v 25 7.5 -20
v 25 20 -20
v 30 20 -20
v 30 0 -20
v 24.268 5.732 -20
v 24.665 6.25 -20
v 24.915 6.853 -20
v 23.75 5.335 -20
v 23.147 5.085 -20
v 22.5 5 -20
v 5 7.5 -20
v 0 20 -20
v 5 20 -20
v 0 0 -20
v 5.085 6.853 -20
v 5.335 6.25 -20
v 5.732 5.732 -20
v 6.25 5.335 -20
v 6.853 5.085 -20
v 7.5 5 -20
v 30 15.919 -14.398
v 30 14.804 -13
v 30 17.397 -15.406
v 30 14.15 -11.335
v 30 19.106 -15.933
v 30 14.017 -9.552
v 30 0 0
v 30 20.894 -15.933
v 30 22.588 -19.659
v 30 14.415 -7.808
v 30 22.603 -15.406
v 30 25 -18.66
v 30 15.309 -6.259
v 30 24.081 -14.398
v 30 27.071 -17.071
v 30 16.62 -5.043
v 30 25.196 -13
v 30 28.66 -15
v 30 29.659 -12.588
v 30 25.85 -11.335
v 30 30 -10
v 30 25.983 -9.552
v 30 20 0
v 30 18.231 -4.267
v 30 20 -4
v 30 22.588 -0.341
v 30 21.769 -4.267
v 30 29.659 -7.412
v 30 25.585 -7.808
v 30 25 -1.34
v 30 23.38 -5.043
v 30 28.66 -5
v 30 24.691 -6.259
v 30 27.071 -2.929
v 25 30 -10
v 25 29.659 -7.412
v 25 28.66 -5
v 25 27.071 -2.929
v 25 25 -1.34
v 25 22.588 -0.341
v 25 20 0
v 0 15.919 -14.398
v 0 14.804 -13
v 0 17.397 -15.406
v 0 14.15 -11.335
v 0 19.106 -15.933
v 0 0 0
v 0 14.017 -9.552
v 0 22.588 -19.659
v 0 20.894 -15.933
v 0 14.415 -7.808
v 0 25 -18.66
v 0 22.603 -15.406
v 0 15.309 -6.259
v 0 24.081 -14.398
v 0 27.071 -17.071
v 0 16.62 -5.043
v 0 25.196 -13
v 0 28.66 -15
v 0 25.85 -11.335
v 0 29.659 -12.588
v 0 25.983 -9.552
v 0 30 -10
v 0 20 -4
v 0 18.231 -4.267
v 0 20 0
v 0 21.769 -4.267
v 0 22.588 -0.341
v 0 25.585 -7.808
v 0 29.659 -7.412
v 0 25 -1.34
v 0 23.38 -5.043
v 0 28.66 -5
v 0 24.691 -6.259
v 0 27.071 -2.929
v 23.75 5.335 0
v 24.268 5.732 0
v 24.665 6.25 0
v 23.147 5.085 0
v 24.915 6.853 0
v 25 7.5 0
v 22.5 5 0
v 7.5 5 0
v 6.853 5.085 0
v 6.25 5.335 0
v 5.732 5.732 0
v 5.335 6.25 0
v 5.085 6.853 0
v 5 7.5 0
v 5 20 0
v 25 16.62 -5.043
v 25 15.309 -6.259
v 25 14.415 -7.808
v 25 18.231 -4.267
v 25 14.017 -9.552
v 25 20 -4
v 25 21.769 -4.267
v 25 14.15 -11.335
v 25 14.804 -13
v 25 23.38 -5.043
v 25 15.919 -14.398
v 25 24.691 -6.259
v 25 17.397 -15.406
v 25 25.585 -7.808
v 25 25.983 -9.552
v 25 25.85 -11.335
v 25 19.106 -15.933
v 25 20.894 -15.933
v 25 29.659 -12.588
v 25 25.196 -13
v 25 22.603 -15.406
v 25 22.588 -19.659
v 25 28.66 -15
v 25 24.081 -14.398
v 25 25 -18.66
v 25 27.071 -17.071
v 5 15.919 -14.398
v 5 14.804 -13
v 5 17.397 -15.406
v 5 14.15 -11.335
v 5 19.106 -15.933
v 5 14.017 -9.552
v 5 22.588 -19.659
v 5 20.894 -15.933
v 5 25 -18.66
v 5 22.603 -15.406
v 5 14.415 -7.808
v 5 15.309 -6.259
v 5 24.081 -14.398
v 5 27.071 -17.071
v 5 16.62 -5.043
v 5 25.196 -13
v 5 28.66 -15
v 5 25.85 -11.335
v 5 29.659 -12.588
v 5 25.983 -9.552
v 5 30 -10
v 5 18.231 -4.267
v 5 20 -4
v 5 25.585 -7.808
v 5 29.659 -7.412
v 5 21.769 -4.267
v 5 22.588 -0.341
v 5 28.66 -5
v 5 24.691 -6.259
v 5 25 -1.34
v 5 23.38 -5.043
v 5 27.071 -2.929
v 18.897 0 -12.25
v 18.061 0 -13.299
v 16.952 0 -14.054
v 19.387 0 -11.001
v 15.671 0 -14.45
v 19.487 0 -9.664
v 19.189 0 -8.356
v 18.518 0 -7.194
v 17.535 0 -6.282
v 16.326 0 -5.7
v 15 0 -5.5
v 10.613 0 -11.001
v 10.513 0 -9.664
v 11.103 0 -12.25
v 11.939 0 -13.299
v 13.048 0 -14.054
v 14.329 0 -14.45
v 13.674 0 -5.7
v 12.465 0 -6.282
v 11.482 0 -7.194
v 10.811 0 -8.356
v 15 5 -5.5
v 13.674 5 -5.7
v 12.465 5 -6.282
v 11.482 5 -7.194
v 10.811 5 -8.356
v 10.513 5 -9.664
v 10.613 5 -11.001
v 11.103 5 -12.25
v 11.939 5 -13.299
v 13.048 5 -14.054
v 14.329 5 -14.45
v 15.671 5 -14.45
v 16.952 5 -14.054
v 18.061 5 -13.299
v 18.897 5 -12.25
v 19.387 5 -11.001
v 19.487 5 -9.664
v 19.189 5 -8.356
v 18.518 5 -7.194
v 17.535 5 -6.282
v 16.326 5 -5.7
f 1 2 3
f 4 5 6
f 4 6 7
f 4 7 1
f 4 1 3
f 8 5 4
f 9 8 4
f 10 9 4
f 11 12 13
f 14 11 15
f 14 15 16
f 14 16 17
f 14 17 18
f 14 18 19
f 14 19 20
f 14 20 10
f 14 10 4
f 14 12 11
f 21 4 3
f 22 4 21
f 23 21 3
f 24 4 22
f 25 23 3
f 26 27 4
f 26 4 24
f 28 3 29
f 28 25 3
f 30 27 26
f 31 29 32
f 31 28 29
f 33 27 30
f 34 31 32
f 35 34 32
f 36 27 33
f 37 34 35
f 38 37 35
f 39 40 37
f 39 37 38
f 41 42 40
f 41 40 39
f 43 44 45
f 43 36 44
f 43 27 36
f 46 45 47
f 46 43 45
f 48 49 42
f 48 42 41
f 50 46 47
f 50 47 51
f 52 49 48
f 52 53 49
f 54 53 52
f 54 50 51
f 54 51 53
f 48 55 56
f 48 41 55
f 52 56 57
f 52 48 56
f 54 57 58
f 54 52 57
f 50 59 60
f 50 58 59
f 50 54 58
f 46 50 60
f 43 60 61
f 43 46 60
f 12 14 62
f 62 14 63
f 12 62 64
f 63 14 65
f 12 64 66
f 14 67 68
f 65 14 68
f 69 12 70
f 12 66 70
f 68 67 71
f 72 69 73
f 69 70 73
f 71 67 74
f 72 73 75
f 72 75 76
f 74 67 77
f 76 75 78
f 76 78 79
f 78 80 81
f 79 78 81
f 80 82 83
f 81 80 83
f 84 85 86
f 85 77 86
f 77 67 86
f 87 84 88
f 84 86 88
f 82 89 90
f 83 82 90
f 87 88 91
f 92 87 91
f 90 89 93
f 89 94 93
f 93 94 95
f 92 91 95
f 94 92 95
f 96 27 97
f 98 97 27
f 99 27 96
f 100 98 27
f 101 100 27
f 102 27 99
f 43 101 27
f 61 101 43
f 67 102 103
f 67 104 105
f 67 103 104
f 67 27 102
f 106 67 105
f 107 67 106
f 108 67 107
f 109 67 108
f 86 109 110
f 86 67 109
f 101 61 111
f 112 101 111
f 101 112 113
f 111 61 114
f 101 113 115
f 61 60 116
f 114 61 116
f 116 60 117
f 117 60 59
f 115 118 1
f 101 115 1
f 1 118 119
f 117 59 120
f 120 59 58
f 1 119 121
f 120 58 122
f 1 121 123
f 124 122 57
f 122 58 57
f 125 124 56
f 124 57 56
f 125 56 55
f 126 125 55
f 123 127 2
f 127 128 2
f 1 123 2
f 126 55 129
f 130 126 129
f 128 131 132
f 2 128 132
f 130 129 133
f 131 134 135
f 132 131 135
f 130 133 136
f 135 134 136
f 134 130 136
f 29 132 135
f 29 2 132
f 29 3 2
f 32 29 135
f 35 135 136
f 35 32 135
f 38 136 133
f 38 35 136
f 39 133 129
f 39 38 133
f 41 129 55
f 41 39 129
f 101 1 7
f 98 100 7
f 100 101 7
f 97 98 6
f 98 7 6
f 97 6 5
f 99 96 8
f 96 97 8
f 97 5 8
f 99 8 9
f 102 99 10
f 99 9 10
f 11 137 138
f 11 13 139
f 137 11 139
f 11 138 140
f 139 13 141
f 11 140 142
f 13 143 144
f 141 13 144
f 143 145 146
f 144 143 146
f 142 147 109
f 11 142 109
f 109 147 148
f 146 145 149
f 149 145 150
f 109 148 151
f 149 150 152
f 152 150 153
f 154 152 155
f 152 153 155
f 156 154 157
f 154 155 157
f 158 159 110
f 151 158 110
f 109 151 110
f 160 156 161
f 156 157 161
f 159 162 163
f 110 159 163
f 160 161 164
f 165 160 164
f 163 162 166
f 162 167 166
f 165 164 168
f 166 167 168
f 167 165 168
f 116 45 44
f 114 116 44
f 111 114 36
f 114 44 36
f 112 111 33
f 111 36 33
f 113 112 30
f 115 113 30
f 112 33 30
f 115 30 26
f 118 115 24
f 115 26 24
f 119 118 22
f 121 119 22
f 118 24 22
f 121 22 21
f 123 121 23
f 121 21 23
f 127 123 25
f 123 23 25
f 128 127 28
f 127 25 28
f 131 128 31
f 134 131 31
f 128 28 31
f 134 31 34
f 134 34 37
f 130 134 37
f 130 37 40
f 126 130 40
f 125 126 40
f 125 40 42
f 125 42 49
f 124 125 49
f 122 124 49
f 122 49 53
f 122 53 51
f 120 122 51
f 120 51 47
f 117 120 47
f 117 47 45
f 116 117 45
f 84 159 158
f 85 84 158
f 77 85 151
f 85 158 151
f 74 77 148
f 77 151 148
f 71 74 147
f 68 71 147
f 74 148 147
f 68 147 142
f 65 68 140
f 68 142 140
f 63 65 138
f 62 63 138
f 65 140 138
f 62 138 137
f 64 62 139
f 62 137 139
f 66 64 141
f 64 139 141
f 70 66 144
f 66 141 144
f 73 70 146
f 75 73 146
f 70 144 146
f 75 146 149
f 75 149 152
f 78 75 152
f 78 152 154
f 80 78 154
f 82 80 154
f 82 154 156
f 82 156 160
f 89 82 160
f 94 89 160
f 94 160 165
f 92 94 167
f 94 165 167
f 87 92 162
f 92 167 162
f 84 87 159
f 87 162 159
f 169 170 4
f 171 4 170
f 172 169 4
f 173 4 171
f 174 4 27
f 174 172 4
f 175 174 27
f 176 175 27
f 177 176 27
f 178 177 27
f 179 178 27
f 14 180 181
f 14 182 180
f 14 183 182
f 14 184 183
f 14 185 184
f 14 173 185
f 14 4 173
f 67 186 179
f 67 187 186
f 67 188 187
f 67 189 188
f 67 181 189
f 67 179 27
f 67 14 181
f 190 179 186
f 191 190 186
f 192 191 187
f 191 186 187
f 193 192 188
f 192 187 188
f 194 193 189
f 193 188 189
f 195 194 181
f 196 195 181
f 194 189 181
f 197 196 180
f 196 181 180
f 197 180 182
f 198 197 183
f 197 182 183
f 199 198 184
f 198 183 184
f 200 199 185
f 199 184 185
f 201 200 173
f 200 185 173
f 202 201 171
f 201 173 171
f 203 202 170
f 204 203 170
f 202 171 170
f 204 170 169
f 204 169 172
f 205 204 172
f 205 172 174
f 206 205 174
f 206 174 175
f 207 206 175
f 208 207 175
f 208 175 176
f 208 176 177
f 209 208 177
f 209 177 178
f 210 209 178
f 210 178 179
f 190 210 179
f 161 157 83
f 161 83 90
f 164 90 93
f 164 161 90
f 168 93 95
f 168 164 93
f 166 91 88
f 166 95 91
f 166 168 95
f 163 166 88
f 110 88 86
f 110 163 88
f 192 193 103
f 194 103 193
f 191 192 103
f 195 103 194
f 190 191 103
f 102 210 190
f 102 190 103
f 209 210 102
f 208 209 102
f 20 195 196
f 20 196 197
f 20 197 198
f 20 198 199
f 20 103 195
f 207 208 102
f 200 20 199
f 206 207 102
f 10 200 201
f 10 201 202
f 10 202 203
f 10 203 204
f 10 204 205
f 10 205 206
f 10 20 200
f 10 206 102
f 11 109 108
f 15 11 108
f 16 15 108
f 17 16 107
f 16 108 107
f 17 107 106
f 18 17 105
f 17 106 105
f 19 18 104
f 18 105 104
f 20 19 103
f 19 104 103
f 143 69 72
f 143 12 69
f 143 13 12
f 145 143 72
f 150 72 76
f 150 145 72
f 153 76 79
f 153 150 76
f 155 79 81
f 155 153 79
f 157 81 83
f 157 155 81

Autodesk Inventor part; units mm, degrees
ref_plane "YZ Plane" through (0, 0, 0) normal (1, 0, 0) x (0, 1, 0)
ref_plane "XZ Plane" through (0, 0, 0) normal (0, 1, 0) x (-1, 0, 0)
ref_plane "XY Plane" through (0, 0, 0) normal (0, 0, 1) x (1, 0, 0)
sketch "Sketch1" plane through (0, 0, 0) normal (1, 0, 0) x (0, 1, 0)
  line L0 (0, 0) -> (30, 0)
  line L1 (30, 0) -> (30, -20)
  line L2 (30, -20) -> (0, -20)
  line L3 (0, -20) -> (0, 0)
  dimension "d0" = 30
  dimension "d1" = 20
extrude "Extrusion1" add sketch "Sketch1" along normal blind 30
sketch "Sketch2" plane through (0, 30, 0) normal (0, 1, 0) x (1, 0, 0)
  line L0 (0, 0) -> (30, 0) projected
  line L1 (0, 20) -> (30, 20) projected
  line L2 (5, 0) -> (25, 0)
  line L3 (25, 0) -> (25, 20)
  line L4 (25, 20) -> (5, 20)
  line L5 (5, 20) -> (5, 0)
  line L6 (30, 20) -> (30, 0) projected
  dimension "d4" = 5
  dimension "d5" = 5
extrude "Extrusion2" cut sketch "Sketch2" against normal blind 25 contours L5 L1 L3 L0
fillet "Fillet1" radius 2.5 2 edges at (5, 5, -10) (25, 5, -10)
hole "Hole1" at (0, 20, -10) direction (1, 0, 0) diameter 12 end through all
fillet "Fillet3" radius 10 4 edges at (27.5, 30, -20) (2.5, 30, -20) (2.5, 30, 0) (27.5, 30, 0)
sketch "Sketch4" plane through (0, 5, 0) normal (0, 1, 0) x (1, 0, 0)
  line L0 (0, 4) -> (0, 16) projected
  line L1 (0, 10) -> (30, 10)
  line L2 (30, 20) -> (30, 0) projected
  point P0 (0, 0)
  point P1 (15, 10)
hole "Hole2" at (15, 5, -10) direction (0, -1, 0) diameter 9 end through all
properties part number "Damper_Mount_03"
